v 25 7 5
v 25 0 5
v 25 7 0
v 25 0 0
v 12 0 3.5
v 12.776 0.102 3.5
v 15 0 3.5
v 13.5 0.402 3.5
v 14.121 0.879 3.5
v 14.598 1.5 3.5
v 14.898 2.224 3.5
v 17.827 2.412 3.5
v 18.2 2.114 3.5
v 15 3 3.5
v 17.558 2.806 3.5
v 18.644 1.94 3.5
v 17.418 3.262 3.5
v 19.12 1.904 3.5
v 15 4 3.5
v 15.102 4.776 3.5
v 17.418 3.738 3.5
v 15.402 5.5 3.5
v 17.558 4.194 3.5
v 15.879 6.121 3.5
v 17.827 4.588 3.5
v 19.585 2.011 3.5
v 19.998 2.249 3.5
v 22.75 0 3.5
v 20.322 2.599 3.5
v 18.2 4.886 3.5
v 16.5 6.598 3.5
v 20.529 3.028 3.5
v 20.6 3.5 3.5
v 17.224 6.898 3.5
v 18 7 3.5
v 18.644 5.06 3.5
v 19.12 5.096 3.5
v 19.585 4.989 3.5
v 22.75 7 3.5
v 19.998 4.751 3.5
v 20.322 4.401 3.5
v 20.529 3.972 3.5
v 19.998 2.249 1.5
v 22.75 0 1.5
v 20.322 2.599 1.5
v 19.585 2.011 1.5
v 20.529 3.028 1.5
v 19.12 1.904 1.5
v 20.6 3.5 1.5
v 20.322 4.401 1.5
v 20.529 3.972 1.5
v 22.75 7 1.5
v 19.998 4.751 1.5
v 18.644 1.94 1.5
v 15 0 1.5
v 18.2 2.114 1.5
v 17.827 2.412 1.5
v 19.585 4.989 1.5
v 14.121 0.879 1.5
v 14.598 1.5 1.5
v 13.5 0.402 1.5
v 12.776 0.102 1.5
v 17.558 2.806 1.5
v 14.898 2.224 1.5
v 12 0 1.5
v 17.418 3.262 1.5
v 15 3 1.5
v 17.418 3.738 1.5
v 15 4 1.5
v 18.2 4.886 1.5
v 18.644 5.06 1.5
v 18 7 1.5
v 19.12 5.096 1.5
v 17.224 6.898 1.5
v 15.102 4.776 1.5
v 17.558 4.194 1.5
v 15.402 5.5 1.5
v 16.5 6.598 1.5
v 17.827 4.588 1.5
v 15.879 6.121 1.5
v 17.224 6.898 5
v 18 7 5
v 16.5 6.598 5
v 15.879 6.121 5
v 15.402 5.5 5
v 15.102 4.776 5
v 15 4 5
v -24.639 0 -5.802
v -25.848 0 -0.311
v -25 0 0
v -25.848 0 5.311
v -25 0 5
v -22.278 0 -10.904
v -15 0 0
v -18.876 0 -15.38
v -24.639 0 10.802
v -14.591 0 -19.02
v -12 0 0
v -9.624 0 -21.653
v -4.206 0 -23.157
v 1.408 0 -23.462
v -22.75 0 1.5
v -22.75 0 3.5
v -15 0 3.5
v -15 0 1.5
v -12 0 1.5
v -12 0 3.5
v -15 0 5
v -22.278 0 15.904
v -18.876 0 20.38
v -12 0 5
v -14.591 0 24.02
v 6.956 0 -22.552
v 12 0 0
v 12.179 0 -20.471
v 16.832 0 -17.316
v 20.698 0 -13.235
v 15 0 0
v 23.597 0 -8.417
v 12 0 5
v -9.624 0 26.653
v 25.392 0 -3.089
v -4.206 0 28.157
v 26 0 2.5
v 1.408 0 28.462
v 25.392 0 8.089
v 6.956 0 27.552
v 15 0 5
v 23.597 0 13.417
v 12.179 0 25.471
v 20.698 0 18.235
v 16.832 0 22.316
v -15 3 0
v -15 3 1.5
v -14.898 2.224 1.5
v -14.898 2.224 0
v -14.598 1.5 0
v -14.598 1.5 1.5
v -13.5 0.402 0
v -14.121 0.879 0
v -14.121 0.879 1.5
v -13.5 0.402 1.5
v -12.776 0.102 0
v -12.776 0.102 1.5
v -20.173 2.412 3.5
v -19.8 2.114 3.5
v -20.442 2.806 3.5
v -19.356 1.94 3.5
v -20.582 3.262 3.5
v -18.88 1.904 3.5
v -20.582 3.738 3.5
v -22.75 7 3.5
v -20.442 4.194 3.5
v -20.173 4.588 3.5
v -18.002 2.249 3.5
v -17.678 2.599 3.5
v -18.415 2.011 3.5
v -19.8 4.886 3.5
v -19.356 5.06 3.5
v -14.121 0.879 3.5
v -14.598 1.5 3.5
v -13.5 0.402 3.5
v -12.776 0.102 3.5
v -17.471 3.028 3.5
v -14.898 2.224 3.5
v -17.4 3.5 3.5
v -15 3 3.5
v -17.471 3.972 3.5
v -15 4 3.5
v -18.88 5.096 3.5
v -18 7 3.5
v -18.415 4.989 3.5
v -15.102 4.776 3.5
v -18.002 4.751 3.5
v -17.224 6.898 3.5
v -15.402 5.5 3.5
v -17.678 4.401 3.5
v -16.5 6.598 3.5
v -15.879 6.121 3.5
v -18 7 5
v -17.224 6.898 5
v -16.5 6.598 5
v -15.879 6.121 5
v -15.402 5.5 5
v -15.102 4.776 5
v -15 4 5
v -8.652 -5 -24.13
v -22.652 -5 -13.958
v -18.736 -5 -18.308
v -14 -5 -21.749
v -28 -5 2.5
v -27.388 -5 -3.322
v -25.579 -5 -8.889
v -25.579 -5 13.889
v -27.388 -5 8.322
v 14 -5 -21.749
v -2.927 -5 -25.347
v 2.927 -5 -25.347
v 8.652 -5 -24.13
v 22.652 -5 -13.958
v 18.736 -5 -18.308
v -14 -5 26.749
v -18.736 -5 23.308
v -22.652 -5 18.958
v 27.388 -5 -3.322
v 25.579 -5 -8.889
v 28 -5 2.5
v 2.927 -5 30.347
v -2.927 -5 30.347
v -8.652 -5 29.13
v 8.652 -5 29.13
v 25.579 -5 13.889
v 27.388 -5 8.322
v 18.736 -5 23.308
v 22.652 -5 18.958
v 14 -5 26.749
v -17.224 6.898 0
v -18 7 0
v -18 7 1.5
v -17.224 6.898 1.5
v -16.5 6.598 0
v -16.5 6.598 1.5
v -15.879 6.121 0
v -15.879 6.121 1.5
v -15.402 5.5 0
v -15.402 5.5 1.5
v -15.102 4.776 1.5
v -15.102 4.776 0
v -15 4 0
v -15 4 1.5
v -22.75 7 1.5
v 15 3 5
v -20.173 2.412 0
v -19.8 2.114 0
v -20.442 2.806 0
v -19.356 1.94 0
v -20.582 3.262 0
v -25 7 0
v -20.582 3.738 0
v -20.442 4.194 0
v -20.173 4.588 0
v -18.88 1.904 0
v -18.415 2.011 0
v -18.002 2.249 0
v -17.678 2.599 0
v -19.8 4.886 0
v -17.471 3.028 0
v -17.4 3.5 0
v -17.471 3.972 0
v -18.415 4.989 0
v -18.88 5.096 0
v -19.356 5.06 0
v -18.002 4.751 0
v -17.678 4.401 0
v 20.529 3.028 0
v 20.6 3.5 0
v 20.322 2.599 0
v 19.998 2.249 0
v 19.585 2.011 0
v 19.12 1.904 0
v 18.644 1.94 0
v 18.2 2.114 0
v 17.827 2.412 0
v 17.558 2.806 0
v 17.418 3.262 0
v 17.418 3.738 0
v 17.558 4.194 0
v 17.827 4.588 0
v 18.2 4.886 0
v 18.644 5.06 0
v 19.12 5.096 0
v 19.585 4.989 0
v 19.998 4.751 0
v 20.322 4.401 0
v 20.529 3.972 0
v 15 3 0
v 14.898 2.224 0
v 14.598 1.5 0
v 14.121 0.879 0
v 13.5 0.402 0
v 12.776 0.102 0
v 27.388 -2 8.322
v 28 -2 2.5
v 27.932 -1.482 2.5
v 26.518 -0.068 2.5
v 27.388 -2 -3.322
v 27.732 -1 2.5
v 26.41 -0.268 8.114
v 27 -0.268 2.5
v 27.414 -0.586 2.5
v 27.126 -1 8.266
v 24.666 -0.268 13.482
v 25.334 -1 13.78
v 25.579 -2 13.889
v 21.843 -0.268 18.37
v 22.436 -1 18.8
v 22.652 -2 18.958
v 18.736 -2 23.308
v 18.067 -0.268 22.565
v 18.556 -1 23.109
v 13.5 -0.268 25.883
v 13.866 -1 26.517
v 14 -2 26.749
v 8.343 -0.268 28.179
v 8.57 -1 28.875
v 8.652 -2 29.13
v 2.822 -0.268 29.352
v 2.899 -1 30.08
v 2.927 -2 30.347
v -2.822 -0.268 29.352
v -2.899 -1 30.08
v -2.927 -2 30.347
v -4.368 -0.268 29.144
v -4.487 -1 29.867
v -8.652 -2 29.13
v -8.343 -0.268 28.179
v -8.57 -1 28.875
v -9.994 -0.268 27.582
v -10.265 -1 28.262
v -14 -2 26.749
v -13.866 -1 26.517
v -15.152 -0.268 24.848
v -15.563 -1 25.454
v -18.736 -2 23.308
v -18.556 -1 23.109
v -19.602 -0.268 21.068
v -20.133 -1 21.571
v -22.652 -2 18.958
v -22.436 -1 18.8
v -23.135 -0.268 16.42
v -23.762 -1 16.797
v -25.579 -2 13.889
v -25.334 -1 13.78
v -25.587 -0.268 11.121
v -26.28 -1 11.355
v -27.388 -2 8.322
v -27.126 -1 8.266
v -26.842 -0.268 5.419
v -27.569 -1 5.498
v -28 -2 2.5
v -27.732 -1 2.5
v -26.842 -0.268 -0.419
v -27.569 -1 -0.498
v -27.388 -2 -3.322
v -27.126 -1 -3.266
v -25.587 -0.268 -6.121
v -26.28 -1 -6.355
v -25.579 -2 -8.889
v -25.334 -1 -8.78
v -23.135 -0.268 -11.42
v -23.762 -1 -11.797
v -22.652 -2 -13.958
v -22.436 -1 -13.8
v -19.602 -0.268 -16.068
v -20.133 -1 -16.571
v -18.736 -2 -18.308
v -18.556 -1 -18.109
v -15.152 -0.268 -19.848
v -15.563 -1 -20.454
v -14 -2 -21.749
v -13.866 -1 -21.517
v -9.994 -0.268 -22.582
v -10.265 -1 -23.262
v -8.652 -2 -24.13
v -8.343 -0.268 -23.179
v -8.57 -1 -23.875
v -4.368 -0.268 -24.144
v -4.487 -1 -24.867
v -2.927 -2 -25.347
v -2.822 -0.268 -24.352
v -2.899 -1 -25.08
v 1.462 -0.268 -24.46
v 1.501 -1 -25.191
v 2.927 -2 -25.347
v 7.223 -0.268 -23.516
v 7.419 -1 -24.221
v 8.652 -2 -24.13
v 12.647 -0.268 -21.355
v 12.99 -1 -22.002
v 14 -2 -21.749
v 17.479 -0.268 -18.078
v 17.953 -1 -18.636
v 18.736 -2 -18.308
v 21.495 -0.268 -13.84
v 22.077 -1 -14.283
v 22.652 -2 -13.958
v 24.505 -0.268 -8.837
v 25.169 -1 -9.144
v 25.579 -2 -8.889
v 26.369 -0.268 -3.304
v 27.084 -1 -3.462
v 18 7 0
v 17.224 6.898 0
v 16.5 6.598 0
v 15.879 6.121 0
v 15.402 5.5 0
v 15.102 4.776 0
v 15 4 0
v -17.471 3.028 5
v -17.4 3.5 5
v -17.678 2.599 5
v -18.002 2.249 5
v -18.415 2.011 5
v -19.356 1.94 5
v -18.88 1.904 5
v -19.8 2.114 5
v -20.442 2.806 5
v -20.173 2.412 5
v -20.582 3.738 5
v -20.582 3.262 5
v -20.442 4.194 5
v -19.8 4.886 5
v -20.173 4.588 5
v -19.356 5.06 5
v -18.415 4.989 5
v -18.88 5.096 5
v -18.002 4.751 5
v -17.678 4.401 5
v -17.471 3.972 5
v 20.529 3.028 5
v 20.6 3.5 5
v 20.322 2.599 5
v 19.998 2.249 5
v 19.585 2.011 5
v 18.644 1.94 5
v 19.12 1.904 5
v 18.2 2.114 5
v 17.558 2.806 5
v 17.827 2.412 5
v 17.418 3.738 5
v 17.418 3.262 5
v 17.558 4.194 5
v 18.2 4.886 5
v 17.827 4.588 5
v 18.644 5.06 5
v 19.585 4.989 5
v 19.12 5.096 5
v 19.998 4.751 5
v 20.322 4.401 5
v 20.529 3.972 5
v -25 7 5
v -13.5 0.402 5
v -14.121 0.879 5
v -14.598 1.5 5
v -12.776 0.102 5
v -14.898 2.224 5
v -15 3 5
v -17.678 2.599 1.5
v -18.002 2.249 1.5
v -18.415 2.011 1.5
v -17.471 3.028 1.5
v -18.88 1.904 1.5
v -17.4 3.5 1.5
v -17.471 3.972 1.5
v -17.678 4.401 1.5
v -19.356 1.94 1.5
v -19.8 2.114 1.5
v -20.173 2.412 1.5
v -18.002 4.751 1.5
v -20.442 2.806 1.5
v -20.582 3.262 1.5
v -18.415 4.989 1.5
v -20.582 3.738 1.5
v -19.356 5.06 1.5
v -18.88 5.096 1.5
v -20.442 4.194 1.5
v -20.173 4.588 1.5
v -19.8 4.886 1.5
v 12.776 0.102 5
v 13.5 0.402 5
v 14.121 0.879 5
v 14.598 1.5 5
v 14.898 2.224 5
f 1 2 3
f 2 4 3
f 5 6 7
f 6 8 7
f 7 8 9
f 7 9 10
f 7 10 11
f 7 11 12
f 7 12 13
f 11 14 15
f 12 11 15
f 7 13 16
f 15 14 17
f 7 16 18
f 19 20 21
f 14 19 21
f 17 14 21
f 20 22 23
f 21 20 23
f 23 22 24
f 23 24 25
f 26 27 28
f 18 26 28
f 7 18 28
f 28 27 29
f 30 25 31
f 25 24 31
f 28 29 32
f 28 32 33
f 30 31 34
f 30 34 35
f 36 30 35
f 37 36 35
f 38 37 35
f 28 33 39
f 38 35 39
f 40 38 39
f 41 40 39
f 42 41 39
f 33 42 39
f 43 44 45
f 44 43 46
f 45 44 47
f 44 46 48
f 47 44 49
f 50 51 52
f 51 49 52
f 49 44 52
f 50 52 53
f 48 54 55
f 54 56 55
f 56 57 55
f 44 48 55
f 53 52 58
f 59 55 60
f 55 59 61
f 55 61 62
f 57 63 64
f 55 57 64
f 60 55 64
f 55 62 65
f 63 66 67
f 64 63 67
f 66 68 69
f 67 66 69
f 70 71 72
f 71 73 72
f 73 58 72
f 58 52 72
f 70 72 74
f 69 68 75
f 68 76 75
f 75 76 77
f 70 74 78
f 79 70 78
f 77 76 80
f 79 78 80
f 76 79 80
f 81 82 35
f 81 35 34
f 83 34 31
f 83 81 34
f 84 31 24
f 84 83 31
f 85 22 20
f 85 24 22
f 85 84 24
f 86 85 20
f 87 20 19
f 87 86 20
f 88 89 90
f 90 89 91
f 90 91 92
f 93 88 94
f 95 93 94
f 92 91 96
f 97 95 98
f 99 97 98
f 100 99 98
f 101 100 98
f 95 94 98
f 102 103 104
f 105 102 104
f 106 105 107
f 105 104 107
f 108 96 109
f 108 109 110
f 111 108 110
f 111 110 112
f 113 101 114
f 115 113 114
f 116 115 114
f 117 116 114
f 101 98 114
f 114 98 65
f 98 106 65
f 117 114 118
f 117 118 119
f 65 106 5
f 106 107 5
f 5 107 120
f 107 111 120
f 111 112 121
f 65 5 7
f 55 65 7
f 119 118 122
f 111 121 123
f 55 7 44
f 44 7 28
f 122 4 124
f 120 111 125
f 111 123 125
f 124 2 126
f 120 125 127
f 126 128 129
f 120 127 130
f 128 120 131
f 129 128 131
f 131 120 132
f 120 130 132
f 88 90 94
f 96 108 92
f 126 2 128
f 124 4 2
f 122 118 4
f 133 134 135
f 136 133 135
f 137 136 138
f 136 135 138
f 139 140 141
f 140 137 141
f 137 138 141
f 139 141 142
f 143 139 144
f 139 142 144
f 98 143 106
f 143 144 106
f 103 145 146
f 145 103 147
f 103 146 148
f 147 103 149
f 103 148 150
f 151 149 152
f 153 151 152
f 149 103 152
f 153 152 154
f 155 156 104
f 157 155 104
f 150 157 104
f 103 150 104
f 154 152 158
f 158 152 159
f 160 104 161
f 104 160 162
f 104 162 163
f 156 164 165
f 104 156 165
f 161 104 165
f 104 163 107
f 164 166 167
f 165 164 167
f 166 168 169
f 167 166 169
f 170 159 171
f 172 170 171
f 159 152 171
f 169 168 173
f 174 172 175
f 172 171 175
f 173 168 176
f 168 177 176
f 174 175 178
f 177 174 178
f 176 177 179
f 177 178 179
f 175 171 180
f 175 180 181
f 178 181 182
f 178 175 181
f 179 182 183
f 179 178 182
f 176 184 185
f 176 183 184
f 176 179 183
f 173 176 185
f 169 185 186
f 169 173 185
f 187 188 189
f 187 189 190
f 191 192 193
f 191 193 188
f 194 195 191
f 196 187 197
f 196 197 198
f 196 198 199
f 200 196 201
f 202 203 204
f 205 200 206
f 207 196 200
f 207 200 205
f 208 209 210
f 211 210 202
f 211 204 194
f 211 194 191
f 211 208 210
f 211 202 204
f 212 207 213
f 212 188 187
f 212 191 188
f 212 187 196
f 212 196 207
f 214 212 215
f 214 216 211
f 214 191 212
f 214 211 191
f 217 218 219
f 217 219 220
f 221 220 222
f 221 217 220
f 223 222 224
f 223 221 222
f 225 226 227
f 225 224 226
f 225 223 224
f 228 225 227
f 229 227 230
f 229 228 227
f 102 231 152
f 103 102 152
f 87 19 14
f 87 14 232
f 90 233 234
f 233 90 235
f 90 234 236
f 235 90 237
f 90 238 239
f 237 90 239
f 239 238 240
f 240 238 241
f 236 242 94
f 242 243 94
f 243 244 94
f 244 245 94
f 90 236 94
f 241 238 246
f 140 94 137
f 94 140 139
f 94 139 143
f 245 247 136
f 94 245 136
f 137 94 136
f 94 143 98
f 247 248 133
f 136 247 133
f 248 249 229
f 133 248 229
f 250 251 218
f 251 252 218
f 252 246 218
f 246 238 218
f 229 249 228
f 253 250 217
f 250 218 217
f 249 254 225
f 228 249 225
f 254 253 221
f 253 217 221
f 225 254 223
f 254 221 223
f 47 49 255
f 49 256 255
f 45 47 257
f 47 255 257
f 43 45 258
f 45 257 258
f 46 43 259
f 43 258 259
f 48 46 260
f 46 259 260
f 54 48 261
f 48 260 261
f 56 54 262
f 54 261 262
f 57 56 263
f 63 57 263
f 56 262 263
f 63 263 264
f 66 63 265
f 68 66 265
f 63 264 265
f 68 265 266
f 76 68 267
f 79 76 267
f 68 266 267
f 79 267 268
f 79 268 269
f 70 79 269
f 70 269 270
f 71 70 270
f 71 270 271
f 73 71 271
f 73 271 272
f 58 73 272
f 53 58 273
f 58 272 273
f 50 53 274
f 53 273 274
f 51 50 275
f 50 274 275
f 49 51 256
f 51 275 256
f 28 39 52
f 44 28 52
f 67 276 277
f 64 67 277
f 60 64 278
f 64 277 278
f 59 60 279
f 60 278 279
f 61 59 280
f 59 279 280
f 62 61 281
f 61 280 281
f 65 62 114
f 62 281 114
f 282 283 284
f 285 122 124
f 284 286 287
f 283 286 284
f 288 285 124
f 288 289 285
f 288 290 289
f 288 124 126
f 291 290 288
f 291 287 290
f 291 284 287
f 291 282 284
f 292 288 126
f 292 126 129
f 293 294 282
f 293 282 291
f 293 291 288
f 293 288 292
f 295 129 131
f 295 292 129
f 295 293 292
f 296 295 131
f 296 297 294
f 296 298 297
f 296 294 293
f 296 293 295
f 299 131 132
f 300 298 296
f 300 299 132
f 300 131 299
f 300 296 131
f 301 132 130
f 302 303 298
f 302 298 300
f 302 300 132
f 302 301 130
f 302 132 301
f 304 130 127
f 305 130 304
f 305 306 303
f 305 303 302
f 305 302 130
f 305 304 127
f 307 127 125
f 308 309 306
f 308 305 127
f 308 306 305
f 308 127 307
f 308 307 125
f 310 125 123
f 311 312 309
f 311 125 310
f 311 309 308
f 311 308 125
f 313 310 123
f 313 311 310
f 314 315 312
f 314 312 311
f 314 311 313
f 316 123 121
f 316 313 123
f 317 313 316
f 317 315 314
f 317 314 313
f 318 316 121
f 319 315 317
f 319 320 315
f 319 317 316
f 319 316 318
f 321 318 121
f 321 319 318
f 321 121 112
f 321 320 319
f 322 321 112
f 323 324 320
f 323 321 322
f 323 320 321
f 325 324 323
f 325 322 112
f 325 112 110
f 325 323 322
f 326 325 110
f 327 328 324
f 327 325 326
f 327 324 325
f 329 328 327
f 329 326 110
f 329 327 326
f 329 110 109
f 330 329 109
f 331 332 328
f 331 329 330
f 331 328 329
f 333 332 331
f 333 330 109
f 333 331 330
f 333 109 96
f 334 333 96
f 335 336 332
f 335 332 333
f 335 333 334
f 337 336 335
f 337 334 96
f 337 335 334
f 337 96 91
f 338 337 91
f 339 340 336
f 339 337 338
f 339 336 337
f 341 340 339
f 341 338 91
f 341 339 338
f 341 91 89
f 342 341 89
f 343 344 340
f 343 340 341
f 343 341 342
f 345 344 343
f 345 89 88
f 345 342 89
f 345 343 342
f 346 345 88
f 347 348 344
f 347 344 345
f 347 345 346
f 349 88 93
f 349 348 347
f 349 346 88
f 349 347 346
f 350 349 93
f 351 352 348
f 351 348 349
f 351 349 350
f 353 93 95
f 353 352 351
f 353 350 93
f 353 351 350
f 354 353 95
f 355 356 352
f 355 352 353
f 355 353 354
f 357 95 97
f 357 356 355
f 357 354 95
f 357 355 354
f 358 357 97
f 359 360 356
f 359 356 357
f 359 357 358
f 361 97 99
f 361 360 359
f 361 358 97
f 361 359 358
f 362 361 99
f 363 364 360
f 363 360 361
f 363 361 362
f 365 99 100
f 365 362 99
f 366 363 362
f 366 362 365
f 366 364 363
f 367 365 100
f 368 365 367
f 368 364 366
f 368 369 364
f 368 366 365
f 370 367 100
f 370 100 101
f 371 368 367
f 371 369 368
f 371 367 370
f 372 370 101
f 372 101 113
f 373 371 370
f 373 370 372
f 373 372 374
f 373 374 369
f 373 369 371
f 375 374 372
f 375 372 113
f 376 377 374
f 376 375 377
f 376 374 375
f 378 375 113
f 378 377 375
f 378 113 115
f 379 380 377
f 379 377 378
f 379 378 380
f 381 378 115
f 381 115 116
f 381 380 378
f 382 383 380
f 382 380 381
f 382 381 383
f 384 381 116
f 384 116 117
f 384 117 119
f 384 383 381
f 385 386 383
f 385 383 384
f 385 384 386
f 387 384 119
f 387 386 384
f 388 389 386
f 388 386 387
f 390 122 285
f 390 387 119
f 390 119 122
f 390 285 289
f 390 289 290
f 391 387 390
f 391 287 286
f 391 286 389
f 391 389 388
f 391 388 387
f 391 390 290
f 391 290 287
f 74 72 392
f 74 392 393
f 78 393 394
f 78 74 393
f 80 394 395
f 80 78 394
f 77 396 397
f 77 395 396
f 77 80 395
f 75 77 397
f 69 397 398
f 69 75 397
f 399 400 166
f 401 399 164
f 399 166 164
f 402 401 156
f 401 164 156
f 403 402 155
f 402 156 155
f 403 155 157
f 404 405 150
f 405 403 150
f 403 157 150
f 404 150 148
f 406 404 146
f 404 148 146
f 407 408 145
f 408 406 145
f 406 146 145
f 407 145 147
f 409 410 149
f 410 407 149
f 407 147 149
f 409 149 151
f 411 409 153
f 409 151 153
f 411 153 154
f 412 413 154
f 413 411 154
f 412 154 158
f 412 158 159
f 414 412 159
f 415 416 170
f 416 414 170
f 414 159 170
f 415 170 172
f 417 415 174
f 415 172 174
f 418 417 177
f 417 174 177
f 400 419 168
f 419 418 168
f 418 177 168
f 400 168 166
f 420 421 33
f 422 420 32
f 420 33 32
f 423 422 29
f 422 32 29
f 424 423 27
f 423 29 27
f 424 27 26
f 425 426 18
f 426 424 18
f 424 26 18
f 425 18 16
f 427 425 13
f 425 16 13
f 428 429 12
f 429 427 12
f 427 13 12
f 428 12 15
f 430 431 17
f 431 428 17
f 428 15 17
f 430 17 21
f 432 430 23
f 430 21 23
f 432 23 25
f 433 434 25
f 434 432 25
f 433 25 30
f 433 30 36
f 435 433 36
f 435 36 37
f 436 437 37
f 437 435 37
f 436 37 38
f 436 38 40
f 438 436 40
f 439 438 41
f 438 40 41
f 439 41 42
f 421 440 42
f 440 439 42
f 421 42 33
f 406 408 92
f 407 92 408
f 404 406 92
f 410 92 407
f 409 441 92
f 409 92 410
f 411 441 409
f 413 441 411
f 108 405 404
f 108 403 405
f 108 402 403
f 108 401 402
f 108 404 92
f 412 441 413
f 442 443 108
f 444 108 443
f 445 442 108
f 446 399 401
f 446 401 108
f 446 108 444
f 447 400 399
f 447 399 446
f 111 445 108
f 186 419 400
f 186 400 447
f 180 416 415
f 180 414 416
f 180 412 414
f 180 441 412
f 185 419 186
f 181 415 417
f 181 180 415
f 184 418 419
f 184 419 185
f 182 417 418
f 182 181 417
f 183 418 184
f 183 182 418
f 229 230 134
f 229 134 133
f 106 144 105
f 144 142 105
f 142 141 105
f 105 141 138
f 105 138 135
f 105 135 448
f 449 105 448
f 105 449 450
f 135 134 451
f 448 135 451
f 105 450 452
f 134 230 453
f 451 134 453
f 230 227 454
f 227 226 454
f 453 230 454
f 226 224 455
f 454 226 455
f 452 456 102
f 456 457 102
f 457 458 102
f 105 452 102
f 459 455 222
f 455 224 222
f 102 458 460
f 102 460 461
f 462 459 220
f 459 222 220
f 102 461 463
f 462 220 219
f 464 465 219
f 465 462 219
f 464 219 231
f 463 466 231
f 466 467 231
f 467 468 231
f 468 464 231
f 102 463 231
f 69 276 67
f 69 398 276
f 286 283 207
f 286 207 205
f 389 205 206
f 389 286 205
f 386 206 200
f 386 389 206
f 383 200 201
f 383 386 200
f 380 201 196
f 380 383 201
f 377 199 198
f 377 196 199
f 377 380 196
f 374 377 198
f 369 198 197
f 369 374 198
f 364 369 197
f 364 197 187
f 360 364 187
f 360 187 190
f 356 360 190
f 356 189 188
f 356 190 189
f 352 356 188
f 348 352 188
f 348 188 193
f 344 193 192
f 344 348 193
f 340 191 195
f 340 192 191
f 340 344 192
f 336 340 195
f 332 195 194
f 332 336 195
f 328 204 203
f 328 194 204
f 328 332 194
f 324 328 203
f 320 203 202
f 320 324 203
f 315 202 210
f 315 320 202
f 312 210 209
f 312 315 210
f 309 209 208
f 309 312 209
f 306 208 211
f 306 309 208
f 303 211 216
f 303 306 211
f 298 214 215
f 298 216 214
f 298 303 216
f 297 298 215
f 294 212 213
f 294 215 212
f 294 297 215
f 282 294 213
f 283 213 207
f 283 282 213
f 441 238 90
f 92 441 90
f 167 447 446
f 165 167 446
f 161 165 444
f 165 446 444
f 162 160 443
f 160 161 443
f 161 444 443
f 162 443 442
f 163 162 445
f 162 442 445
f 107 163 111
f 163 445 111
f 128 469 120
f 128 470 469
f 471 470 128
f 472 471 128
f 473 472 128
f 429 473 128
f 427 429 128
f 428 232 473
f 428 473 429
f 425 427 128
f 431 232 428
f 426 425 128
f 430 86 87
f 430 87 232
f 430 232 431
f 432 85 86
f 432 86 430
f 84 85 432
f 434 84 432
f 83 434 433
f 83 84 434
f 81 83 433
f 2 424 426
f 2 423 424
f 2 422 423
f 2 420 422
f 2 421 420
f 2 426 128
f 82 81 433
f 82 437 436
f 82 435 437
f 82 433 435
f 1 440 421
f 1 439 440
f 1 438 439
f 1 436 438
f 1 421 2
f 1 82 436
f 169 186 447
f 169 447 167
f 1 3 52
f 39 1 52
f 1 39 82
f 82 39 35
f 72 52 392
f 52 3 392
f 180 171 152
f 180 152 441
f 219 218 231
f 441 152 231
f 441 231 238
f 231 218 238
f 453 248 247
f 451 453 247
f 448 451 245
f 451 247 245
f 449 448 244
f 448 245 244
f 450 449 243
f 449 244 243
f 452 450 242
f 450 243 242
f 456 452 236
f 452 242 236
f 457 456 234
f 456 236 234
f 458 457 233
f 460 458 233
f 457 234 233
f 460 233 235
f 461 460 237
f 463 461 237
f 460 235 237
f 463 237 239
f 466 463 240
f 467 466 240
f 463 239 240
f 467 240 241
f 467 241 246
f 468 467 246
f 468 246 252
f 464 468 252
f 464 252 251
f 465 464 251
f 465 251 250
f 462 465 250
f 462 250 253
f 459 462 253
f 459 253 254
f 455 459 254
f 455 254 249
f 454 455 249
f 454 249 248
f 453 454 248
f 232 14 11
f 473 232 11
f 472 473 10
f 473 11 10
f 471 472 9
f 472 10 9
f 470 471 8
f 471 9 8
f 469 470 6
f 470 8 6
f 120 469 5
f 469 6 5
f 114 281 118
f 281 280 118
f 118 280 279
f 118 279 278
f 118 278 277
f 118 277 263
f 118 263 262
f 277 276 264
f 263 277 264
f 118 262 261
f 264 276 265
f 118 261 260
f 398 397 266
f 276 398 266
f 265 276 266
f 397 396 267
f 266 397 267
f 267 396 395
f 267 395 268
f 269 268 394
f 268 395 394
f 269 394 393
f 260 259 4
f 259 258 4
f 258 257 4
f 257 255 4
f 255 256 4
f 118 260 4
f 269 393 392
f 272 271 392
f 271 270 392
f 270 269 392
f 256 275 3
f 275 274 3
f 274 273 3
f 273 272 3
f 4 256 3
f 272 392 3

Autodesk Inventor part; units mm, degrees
ref_plane "YZ Plane" through (0, 0, 0) normal (1, 0, 0) x (0, 1, 0)
ref_plane "XZ Plane" through (0, 0, 0) normal (0, 1, 0) x (-1, 0, 0)
ref_plane "XY Plane" through (0, 0, 0) normal (0, 0, 1) x (1, 0, 0)
sketch "Sketch1" plane through (0, 0, 0) normal (0, 0, 1) x (1, 0, 0)
  line L0 (25, 7) -> (-25, 7)
  line L1 (-25, 7) -> (-25, 0)
  line L2 (-25, 0) -> (25, 0)
  line L3 (25, 0) -> (25, 7)
  circle A0 centre (-19, 3.5) radius 1.6
  circle A1 centre (19, 3.5) radius 1.6
  line L4 (19, 3.5) -> (-19, 3.5) construction
  line L5 (19, 3.5) -> (25, 7) construction
  line L6 (19, 3.5) -> (25, 0) construction
  line L7 (-19, 3.5) -> (-25, 7) construction
  line L8 (-19, 3.5) -> (-25, 0) construction
  line L9 (0, 0) -> (-19, 3.5) construction
  line L10 (0, 0) -> (19, 3.5) construction
  dimension "d0" = 3.2
  dimension "d1" = 38
  dimension "d2" = 7
  dimension "d3" = 50
extrude "Extrusion1" add sketch "Sketch1" along normal blind 5
sketch "Sketch2" plane through (-25, 7, 0) normal (0, 1, 0) x (1, 0, 0)
  line L0 (2.25, -3.5) -> (10, -3.5)
  line L1 (47.75, -3.5) -> (47.75, -1.5)
  line L2 (47.75, -1.5) -> (40, -1.5)
  line L3 (2.25, -1.5) -> (2.25, -3.5)
  line L4 (50, -5) -> (0, -5) construction
  line L5 (0, -5) -> (2.25, -3.5) construction
  line L6 (50, 0) -> (0, 0) construction
  line L7 (2.25, -1.5) -> (0, 0) construction
  line L8 (50, 0) -> (50, -5) construction
  line L9 (47.75, -3.5) -> (50, -5) construction
  line L10 (40, -3.5) -> (40, -5)
  line L11 (40, -5) -> (10, -5)
  line L12 (10, -5) -> (10, -3.5)
  line L13 (10, -1.5) -> (10, 0)
  line L14 (10, 0) -> (40, 0)
  line L15 (40, 0) -> (40, -1.5)
  line L16 (40, -3.5) -> (47.75, -3.5)
  line L17 (40, -1.5) -> (10, -1.5) construction
  line L18 (10, -3.5) -> (40, -3.5) construction
  line L19 (10, -1.5) -> (2.25, -1.5)
  line L20 (47.75, -3.5) -> (40, -5) construction
  line L21 (40, 0) -> (47.75, -1.5) construction
  line L22 (10, -5) -> (2.25, -3.5) construction
  line L23 (2.25, -1.5) -> (10, 0) construction
  point P0 (25, 0)
  dimension "d6" = 45.5
  dimension "d7" = 2
  dimension "d13" = 30
extrude "Extrusion2" cut sketch "Sketch2" against normal up to next
sketch "Sketch3" plane through (-25, 0, 0) normal (0, -1, 0) x (1, 0, 0)
  circle A0 centre (25, 2.5) radius 28
  line L0 (0, 5) -> (50, 5) construction
  line L1 (0, 5) -> (25, 2.5) construction
  line L2 (0, 0) -> (50, 0) construction
  line L3 (25, 2.5) -> (0, 0) construction
  line L4 (25, 2.5) -> (50, 5) construction
  point P0 (25, 0)
  dimension "d10" = 56
extrude "Extrusion3" add sketch "Sketch3" along normal blind 5
fillet "Fillet1" radius 3 8 edges at (15, 7, 0.75) (15, 7, 4.25) (15, 0, 4.25) (15, 0, 0.75) (-15, 0, 0.75) (-15, 7, 0.75) (-15, 7, 4.25) (-15, 0, 4.25)
fillet "Fillet2" radius 2 1 edges at (-28, 0, 2.5)
properties part number "Main PCB Base"
